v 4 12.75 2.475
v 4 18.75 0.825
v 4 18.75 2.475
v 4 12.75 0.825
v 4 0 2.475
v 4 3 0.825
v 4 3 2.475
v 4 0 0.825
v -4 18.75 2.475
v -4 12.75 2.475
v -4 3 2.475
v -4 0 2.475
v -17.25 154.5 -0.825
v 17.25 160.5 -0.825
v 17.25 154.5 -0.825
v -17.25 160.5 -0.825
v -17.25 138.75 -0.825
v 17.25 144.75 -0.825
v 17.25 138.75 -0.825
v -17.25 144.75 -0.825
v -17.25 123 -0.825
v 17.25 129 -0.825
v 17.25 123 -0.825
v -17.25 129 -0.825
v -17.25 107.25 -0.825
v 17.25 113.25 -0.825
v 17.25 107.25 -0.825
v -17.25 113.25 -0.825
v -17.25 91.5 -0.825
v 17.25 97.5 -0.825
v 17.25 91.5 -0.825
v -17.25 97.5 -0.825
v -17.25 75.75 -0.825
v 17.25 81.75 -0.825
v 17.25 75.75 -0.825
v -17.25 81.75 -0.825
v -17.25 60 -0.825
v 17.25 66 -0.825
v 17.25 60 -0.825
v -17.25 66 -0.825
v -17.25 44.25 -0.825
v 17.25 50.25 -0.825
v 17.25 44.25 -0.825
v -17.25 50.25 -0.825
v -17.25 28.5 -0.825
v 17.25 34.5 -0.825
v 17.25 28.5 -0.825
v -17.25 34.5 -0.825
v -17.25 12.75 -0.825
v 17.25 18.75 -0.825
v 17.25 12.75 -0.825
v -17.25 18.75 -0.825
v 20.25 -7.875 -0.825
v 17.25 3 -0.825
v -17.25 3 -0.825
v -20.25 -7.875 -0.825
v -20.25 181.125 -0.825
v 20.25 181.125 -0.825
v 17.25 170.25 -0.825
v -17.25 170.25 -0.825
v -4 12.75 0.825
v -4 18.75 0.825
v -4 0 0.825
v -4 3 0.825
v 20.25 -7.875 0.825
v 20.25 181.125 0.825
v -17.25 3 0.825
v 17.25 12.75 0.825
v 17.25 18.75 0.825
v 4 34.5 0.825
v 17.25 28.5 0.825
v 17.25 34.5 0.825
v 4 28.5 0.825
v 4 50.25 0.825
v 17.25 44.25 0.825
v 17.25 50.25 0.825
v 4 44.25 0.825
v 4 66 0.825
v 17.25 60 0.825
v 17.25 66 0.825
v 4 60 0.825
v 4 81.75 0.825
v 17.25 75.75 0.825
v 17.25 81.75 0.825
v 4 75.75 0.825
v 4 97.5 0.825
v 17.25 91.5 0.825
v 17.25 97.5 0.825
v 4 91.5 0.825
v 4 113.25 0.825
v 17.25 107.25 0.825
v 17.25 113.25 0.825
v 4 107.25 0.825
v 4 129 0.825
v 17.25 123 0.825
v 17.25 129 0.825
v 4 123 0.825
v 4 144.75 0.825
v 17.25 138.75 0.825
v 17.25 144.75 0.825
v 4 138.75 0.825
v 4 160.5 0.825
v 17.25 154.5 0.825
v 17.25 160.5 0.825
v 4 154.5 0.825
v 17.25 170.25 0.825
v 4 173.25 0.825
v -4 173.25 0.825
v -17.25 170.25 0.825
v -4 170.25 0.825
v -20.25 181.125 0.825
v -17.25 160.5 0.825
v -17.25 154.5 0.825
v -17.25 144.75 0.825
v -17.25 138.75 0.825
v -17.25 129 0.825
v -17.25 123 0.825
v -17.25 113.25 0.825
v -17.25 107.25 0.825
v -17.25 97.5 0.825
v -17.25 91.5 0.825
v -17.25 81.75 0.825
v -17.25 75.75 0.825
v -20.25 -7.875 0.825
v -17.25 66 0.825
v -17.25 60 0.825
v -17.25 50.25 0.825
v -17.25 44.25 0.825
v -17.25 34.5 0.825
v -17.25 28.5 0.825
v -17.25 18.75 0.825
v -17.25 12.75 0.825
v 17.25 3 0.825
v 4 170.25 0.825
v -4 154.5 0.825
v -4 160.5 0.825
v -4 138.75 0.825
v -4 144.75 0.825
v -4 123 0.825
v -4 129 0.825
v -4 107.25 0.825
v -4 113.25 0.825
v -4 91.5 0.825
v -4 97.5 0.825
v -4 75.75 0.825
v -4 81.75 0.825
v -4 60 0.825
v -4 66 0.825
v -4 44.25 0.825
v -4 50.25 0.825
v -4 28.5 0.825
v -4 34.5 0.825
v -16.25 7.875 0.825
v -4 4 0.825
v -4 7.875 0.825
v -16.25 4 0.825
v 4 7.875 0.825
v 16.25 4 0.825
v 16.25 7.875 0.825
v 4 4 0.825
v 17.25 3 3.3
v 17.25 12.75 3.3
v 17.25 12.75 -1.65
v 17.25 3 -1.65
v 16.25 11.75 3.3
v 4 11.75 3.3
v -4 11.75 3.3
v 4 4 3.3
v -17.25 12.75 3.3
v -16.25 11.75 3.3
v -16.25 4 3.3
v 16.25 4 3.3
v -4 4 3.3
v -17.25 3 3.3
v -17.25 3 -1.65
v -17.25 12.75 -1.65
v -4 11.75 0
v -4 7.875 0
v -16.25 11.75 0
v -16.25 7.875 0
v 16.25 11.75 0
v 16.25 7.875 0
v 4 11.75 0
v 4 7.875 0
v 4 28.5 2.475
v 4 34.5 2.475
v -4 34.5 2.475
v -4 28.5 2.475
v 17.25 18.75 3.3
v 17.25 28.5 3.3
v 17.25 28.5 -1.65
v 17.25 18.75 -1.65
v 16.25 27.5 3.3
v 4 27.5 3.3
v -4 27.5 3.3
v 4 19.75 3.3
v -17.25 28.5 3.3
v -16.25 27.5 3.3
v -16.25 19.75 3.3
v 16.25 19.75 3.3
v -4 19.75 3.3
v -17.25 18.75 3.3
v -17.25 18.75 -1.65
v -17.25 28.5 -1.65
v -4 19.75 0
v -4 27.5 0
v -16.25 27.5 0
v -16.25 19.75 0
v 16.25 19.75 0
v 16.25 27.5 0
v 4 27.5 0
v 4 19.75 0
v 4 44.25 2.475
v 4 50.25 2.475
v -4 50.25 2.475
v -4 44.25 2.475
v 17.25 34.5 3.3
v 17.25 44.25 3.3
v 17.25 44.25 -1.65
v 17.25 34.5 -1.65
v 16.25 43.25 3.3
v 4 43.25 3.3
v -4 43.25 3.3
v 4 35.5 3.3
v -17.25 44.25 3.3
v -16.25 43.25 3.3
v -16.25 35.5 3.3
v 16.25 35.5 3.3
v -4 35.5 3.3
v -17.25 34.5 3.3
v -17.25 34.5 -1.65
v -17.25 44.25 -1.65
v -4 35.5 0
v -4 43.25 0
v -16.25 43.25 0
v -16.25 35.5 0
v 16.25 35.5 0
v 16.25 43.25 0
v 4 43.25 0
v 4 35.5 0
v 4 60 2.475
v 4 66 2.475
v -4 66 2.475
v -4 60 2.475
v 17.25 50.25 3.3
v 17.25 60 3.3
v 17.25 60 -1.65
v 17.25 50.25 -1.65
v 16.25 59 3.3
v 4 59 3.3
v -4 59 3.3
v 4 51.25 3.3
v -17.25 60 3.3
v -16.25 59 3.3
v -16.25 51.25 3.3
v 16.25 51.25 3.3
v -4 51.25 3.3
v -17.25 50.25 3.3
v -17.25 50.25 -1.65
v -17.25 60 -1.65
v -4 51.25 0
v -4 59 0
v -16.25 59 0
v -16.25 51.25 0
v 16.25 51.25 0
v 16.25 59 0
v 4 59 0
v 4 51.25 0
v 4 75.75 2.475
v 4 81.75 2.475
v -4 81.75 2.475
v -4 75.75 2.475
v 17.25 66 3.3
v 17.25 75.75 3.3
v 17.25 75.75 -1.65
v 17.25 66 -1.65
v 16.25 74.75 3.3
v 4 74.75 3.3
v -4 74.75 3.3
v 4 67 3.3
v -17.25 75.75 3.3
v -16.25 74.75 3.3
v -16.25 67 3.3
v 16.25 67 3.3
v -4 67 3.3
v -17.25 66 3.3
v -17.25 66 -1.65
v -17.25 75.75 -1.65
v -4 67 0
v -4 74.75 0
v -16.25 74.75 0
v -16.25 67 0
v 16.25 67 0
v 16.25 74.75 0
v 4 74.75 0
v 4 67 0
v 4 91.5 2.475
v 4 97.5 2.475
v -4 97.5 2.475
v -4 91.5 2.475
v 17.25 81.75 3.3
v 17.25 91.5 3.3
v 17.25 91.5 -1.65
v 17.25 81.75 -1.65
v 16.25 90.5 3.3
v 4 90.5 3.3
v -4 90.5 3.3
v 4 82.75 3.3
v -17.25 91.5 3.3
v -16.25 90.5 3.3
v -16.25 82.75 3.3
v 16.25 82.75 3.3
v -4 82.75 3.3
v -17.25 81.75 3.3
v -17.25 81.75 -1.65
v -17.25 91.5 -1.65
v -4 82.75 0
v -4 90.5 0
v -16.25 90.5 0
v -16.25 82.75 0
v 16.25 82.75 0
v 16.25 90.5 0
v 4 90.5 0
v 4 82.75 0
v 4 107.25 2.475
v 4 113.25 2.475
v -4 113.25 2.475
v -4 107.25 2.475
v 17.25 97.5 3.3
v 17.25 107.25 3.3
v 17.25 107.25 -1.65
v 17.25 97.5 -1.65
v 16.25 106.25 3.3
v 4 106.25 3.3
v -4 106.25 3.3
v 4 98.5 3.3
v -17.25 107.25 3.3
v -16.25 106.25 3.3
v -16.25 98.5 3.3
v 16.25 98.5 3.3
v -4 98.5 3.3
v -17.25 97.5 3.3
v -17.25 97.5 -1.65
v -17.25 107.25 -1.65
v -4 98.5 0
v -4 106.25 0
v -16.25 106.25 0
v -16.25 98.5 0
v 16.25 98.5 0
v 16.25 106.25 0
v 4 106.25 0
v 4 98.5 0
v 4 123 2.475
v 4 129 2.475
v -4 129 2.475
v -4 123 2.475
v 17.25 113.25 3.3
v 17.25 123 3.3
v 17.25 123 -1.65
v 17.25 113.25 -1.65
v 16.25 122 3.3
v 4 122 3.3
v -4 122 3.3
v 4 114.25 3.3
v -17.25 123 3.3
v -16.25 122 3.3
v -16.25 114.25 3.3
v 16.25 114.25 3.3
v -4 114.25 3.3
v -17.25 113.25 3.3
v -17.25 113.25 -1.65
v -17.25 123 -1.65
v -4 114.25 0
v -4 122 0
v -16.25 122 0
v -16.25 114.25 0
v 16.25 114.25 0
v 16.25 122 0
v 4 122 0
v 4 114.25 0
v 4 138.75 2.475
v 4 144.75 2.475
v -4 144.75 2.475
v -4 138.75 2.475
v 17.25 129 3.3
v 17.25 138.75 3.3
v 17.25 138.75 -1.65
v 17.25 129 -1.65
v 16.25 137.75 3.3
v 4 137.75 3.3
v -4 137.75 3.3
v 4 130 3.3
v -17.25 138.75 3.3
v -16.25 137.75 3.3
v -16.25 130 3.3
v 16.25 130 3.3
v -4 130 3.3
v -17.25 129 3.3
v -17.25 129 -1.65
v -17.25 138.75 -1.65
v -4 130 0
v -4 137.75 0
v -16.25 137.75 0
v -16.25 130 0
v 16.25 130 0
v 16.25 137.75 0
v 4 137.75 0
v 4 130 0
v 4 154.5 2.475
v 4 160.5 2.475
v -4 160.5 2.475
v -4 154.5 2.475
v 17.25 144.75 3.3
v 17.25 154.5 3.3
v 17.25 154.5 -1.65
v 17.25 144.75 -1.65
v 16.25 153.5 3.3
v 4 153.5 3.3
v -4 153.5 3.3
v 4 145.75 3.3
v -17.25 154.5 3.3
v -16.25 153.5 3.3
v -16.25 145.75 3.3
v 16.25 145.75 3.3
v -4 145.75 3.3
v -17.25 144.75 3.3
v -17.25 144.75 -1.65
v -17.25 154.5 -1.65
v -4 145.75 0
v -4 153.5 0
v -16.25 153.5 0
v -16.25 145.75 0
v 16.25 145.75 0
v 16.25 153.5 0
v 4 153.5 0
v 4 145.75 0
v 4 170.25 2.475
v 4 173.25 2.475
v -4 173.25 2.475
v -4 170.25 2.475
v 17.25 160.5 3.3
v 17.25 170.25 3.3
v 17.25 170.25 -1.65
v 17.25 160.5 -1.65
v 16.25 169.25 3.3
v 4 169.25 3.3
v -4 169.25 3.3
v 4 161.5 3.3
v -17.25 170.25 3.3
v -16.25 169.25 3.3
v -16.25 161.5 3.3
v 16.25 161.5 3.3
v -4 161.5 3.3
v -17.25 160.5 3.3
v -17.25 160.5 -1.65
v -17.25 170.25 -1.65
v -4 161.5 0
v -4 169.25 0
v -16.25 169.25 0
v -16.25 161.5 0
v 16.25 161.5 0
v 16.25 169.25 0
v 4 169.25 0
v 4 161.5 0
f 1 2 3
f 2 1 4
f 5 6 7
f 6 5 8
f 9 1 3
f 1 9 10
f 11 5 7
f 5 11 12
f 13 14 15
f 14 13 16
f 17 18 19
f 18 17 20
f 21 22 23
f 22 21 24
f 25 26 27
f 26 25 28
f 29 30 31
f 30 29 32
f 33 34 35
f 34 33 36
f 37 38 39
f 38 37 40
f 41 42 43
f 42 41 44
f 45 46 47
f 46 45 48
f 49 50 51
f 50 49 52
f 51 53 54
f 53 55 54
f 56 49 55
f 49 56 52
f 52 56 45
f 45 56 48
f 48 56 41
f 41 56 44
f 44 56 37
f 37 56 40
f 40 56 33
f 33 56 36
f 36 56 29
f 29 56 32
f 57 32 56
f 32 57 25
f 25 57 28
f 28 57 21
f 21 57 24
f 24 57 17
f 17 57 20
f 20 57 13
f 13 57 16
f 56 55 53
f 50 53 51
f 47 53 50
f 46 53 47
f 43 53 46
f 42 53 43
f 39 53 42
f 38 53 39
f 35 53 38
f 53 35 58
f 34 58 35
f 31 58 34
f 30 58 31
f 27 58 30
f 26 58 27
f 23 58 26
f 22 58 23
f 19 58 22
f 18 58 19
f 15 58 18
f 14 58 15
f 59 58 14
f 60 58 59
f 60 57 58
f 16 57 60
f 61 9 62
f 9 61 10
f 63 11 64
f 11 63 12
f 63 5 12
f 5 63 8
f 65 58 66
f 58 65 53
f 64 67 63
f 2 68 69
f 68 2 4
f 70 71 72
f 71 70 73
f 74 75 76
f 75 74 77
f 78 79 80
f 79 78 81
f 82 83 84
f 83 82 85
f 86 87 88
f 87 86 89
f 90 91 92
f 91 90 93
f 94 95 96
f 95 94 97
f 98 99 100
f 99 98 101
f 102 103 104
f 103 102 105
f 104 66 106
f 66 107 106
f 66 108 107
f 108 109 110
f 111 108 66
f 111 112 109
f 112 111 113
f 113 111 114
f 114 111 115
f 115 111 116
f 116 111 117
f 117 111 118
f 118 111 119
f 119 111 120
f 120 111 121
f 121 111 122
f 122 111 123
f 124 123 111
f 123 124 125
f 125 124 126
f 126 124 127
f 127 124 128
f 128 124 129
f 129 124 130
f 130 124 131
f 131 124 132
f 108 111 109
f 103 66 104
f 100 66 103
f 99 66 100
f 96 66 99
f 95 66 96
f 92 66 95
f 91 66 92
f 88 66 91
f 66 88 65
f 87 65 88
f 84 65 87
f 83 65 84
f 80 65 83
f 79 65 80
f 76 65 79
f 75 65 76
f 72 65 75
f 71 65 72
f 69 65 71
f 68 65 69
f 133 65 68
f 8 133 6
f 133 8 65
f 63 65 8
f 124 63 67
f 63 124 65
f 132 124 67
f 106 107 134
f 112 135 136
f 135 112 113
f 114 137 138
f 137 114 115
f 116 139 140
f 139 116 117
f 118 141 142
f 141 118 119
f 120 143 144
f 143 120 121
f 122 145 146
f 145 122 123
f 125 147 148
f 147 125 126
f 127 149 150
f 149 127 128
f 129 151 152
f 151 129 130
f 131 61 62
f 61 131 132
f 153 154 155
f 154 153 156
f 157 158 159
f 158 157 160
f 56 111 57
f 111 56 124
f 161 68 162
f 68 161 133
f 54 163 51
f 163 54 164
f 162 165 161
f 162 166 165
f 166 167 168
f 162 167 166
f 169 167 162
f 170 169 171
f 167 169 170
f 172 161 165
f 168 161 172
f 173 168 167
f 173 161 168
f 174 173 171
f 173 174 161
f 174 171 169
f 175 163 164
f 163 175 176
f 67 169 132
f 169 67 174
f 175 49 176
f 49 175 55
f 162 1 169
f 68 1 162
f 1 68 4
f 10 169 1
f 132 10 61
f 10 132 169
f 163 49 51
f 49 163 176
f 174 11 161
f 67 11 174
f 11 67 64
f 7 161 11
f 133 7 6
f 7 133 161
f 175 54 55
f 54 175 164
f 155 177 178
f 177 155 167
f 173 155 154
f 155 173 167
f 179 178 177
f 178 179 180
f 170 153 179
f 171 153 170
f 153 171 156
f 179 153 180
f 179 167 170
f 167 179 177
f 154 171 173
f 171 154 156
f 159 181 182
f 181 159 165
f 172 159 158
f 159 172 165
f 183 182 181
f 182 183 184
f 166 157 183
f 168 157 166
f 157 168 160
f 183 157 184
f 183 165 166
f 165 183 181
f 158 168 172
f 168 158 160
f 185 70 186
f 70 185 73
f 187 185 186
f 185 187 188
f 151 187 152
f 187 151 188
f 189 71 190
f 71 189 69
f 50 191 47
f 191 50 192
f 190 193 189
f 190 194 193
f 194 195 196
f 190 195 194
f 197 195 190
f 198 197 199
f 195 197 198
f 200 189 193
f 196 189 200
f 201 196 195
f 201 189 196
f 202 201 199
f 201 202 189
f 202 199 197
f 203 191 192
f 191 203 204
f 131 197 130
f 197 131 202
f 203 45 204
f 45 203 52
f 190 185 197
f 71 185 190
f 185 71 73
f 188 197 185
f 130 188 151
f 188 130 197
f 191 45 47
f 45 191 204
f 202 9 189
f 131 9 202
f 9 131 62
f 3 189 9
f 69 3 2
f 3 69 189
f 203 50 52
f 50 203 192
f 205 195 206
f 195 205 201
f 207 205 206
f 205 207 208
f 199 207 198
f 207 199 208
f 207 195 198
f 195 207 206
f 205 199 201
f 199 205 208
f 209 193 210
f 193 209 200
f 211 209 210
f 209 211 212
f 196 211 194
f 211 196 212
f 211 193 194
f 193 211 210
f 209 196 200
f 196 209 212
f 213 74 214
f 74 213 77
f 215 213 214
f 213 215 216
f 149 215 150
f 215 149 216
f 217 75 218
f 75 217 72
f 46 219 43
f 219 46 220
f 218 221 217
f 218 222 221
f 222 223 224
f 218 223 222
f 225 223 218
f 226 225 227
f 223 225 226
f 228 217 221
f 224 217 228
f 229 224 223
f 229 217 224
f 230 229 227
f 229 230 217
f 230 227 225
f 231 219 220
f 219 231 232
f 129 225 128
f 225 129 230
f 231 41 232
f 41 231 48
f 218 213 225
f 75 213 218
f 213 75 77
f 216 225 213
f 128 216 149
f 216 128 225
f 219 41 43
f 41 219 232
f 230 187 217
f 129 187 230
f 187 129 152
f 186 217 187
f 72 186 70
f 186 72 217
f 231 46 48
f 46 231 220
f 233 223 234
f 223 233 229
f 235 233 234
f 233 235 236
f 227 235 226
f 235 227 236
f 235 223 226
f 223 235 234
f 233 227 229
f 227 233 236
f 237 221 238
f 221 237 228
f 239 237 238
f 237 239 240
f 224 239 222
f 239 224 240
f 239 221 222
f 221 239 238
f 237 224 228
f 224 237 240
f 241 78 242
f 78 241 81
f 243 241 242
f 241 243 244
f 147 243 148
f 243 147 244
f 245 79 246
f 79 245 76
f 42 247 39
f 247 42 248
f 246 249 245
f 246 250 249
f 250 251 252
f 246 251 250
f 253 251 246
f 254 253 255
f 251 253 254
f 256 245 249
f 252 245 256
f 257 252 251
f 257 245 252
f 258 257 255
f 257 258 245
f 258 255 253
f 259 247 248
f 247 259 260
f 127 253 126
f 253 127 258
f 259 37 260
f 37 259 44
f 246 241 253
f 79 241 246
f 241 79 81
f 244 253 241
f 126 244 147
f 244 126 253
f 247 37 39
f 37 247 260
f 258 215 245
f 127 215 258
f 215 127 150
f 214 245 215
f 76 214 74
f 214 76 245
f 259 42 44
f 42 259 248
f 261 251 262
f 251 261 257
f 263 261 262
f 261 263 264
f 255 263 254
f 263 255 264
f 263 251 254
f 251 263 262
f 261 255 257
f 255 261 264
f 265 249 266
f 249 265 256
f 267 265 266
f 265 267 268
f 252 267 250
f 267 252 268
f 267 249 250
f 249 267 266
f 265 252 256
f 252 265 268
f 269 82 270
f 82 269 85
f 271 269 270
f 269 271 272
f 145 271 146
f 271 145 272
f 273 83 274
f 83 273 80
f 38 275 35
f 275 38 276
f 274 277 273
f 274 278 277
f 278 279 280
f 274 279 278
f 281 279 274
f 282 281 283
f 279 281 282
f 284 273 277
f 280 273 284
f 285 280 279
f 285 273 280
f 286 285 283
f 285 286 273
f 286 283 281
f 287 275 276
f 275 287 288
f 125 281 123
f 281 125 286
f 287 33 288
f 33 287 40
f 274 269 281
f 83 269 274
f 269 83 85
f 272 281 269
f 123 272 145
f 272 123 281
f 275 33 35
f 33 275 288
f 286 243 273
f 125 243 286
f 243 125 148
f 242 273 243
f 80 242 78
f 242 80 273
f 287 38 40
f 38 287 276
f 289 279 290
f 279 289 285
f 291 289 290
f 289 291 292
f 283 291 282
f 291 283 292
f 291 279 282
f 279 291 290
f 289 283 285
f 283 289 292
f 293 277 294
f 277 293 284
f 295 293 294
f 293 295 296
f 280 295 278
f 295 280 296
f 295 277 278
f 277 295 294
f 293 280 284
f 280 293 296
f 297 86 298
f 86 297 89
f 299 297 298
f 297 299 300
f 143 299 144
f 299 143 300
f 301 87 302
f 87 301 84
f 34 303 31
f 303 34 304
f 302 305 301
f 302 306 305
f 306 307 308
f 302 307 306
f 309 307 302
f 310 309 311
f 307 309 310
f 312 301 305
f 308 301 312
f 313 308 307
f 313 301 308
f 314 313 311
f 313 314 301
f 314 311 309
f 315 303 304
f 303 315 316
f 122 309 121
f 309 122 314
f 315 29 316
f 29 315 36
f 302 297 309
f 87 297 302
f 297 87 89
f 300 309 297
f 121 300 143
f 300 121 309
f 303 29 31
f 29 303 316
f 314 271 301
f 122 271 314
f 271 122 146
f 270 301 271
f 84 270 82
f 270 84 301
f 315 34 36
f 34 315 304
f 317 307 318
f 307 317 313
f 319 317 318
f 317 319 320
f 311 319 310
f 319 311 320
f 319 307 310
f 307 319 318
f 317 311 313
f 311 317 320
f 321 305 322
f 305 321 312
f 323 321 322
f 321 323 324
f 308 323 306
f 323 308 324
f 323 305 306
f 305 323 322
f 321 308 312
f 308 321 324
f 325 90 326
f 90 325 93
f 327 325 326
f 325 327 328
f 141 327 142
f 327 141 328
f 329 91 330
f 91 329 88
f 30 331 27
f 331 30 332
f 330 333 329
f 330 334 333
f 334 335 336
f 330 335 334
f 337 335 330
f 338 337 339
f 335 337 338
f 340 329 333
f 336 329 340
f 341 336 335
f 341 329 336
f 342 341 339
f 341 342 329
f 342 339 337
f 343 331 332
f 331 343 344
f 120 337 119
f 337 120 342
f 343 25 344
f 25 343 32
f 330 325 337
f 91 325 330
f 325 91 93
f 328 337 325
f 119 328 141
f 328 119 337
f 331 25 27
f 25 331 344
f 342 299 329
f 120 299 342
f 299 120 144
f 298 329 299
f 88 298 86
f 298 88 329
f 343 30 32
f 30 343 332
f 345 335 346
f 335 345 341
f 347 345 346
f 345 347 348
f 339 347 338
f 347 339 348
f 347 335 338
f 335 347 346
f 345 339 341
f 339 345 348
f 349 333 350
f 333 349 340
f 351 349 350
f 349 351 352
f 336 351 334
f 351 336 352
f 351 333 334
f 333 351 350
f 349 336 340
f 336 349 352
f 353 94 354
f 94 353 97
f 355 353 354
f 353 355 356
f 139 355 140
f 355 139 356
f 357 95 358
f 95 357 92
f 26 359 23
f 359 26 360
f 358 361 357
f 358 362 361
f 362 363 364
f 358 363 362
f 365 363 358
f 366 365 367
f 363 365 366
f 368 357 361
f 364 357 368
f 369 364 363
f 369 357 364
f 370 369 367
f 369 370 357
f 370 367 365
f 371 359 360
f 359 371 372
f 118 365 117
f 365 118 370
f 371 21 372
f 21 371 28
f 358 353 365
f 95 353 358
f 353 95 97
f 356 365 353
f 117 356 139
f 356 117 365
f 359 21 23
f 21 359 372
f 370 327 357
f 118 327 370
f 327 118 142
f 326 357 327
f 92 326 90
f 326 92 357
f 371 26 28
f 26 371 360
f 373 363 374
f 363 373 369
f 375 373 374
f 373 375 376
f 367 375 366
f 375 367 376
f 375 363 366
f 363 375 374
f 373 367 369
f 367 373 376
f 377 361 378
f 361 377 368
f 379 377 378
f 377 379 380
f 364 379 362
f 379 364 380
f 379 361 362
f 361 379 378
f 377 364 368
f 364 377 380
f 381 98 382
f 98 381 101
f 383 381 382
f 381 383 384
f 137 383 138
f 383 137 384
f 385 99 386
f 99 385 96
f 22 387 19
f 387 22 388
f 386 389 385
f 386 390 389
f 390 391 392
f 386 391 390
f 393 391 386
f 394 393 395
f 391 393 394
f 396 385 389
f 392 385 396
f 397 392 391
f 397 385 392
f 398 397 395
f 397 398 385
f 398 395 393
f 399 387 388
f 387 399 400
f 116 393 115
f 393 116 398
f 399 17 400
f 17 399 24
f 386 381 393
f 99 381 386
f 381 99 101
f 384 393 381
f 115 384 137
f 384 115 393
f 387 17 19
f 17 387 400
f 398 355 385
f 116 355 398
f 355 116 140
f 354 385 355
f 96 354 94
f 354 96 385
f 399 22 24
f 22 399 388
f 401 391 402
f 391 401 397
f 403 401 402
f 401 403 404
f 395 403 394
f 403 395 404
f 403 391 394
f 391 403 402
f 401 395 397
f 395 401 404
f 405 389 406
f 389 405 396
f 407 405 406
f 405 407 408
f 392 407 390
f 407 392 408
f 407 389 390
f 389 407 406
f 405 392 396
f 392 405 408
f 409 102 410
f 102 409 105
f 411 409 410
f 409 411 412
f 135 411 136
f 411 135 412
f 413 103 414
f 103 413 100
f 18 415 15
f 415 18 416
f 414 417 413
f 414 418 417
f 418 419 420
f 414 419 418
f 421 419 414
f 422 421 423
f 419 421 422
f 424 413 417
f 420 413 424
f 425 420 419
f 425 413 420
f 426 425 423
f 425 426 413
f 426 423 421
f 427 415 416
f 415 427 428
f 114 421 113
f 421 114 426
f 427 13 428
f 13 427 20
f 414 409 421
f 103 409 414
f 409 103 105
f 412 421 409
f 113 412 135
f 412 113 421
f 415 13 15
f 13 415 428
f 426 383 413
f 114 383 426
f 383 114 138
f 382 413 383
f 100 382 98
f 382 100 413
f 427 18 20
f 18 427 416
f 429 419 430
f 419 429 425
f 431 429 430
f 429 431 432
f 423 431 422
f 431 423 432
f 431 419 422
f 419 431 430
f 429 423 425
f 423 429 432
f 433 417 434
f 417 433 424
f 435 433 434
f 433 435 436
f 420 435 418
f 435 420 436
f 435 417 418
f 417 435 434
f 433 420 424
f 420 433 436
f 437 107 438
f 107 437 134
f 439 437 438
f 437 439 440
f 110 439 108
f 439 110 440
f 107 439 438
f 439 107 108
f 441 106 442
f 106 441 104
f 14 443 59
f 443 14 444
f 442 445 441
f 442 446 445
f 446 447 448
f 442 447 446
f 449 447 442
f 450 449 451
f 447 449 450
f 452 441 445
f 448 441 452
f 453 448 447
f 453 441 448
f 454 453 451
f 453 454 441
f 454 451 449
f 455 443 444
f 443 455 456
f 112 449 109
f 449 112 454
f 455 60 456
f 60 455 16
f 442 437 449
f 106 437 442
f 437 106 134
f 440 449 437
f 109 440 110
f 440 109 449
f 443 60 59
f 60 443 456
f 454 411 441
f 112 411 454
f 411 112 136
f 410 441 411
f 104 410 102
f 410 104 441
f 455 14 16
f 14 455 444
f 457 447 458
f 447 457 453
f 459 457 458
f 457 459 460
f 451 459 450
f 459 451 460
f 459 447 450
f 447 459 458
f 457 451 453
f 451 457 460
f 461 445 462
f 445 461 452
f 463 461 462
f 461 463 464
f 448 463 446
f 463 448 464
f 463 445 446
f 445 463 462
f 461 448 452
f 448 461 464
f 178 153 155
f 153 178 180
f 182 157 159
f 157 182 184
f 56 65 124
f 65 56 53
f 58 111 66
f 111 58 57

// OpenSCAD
$footW = 24.5;
$footH = 15.5;
$spacer = 16;
$depth = 5;
$rim = 2;
$blockW = $footW * 2 + $spacer*2;
$blockL = $footH + $spacer;

module footplate() {
    difference() {
        union() {
            translate([0, 0, $depth/2]) { 
                    cube([$spacer, 
                    $blockL, $depth*2], true);
                }
        cube([$blockW, $blockL, $depth], true);
        translate([0, 0, $depth/2]) { 
            cube([$footW*2+$spacer + $rim*2, 
            $footH+$rim*2, $depth*3], true);
        }
        }
        translate([-($footW + $spacer/2), 
                   -$footH/2, 0]) {
            cube([$footW, $footH, 30], false);
        }
        translate([$spacer / 2, -$footH/2, 0]) {
            cube([$footW, $footH, 30], false);
        }
        
    }
    
}

scale([.5, .5, .33]) {
union() {
    for (i = [0:10]) {
        translate([0, $blockL/2 + $blockL * i, 0]) {
            footplate();
        }   
    }
    cube([$blockW, $blockL, $depth], true);
    translate([-$blockW/2, $blockL + $blockL * 10, -$depth/2]) {
        cube([$blockW, $blockL/2, $depth], false);
    }
}
}
